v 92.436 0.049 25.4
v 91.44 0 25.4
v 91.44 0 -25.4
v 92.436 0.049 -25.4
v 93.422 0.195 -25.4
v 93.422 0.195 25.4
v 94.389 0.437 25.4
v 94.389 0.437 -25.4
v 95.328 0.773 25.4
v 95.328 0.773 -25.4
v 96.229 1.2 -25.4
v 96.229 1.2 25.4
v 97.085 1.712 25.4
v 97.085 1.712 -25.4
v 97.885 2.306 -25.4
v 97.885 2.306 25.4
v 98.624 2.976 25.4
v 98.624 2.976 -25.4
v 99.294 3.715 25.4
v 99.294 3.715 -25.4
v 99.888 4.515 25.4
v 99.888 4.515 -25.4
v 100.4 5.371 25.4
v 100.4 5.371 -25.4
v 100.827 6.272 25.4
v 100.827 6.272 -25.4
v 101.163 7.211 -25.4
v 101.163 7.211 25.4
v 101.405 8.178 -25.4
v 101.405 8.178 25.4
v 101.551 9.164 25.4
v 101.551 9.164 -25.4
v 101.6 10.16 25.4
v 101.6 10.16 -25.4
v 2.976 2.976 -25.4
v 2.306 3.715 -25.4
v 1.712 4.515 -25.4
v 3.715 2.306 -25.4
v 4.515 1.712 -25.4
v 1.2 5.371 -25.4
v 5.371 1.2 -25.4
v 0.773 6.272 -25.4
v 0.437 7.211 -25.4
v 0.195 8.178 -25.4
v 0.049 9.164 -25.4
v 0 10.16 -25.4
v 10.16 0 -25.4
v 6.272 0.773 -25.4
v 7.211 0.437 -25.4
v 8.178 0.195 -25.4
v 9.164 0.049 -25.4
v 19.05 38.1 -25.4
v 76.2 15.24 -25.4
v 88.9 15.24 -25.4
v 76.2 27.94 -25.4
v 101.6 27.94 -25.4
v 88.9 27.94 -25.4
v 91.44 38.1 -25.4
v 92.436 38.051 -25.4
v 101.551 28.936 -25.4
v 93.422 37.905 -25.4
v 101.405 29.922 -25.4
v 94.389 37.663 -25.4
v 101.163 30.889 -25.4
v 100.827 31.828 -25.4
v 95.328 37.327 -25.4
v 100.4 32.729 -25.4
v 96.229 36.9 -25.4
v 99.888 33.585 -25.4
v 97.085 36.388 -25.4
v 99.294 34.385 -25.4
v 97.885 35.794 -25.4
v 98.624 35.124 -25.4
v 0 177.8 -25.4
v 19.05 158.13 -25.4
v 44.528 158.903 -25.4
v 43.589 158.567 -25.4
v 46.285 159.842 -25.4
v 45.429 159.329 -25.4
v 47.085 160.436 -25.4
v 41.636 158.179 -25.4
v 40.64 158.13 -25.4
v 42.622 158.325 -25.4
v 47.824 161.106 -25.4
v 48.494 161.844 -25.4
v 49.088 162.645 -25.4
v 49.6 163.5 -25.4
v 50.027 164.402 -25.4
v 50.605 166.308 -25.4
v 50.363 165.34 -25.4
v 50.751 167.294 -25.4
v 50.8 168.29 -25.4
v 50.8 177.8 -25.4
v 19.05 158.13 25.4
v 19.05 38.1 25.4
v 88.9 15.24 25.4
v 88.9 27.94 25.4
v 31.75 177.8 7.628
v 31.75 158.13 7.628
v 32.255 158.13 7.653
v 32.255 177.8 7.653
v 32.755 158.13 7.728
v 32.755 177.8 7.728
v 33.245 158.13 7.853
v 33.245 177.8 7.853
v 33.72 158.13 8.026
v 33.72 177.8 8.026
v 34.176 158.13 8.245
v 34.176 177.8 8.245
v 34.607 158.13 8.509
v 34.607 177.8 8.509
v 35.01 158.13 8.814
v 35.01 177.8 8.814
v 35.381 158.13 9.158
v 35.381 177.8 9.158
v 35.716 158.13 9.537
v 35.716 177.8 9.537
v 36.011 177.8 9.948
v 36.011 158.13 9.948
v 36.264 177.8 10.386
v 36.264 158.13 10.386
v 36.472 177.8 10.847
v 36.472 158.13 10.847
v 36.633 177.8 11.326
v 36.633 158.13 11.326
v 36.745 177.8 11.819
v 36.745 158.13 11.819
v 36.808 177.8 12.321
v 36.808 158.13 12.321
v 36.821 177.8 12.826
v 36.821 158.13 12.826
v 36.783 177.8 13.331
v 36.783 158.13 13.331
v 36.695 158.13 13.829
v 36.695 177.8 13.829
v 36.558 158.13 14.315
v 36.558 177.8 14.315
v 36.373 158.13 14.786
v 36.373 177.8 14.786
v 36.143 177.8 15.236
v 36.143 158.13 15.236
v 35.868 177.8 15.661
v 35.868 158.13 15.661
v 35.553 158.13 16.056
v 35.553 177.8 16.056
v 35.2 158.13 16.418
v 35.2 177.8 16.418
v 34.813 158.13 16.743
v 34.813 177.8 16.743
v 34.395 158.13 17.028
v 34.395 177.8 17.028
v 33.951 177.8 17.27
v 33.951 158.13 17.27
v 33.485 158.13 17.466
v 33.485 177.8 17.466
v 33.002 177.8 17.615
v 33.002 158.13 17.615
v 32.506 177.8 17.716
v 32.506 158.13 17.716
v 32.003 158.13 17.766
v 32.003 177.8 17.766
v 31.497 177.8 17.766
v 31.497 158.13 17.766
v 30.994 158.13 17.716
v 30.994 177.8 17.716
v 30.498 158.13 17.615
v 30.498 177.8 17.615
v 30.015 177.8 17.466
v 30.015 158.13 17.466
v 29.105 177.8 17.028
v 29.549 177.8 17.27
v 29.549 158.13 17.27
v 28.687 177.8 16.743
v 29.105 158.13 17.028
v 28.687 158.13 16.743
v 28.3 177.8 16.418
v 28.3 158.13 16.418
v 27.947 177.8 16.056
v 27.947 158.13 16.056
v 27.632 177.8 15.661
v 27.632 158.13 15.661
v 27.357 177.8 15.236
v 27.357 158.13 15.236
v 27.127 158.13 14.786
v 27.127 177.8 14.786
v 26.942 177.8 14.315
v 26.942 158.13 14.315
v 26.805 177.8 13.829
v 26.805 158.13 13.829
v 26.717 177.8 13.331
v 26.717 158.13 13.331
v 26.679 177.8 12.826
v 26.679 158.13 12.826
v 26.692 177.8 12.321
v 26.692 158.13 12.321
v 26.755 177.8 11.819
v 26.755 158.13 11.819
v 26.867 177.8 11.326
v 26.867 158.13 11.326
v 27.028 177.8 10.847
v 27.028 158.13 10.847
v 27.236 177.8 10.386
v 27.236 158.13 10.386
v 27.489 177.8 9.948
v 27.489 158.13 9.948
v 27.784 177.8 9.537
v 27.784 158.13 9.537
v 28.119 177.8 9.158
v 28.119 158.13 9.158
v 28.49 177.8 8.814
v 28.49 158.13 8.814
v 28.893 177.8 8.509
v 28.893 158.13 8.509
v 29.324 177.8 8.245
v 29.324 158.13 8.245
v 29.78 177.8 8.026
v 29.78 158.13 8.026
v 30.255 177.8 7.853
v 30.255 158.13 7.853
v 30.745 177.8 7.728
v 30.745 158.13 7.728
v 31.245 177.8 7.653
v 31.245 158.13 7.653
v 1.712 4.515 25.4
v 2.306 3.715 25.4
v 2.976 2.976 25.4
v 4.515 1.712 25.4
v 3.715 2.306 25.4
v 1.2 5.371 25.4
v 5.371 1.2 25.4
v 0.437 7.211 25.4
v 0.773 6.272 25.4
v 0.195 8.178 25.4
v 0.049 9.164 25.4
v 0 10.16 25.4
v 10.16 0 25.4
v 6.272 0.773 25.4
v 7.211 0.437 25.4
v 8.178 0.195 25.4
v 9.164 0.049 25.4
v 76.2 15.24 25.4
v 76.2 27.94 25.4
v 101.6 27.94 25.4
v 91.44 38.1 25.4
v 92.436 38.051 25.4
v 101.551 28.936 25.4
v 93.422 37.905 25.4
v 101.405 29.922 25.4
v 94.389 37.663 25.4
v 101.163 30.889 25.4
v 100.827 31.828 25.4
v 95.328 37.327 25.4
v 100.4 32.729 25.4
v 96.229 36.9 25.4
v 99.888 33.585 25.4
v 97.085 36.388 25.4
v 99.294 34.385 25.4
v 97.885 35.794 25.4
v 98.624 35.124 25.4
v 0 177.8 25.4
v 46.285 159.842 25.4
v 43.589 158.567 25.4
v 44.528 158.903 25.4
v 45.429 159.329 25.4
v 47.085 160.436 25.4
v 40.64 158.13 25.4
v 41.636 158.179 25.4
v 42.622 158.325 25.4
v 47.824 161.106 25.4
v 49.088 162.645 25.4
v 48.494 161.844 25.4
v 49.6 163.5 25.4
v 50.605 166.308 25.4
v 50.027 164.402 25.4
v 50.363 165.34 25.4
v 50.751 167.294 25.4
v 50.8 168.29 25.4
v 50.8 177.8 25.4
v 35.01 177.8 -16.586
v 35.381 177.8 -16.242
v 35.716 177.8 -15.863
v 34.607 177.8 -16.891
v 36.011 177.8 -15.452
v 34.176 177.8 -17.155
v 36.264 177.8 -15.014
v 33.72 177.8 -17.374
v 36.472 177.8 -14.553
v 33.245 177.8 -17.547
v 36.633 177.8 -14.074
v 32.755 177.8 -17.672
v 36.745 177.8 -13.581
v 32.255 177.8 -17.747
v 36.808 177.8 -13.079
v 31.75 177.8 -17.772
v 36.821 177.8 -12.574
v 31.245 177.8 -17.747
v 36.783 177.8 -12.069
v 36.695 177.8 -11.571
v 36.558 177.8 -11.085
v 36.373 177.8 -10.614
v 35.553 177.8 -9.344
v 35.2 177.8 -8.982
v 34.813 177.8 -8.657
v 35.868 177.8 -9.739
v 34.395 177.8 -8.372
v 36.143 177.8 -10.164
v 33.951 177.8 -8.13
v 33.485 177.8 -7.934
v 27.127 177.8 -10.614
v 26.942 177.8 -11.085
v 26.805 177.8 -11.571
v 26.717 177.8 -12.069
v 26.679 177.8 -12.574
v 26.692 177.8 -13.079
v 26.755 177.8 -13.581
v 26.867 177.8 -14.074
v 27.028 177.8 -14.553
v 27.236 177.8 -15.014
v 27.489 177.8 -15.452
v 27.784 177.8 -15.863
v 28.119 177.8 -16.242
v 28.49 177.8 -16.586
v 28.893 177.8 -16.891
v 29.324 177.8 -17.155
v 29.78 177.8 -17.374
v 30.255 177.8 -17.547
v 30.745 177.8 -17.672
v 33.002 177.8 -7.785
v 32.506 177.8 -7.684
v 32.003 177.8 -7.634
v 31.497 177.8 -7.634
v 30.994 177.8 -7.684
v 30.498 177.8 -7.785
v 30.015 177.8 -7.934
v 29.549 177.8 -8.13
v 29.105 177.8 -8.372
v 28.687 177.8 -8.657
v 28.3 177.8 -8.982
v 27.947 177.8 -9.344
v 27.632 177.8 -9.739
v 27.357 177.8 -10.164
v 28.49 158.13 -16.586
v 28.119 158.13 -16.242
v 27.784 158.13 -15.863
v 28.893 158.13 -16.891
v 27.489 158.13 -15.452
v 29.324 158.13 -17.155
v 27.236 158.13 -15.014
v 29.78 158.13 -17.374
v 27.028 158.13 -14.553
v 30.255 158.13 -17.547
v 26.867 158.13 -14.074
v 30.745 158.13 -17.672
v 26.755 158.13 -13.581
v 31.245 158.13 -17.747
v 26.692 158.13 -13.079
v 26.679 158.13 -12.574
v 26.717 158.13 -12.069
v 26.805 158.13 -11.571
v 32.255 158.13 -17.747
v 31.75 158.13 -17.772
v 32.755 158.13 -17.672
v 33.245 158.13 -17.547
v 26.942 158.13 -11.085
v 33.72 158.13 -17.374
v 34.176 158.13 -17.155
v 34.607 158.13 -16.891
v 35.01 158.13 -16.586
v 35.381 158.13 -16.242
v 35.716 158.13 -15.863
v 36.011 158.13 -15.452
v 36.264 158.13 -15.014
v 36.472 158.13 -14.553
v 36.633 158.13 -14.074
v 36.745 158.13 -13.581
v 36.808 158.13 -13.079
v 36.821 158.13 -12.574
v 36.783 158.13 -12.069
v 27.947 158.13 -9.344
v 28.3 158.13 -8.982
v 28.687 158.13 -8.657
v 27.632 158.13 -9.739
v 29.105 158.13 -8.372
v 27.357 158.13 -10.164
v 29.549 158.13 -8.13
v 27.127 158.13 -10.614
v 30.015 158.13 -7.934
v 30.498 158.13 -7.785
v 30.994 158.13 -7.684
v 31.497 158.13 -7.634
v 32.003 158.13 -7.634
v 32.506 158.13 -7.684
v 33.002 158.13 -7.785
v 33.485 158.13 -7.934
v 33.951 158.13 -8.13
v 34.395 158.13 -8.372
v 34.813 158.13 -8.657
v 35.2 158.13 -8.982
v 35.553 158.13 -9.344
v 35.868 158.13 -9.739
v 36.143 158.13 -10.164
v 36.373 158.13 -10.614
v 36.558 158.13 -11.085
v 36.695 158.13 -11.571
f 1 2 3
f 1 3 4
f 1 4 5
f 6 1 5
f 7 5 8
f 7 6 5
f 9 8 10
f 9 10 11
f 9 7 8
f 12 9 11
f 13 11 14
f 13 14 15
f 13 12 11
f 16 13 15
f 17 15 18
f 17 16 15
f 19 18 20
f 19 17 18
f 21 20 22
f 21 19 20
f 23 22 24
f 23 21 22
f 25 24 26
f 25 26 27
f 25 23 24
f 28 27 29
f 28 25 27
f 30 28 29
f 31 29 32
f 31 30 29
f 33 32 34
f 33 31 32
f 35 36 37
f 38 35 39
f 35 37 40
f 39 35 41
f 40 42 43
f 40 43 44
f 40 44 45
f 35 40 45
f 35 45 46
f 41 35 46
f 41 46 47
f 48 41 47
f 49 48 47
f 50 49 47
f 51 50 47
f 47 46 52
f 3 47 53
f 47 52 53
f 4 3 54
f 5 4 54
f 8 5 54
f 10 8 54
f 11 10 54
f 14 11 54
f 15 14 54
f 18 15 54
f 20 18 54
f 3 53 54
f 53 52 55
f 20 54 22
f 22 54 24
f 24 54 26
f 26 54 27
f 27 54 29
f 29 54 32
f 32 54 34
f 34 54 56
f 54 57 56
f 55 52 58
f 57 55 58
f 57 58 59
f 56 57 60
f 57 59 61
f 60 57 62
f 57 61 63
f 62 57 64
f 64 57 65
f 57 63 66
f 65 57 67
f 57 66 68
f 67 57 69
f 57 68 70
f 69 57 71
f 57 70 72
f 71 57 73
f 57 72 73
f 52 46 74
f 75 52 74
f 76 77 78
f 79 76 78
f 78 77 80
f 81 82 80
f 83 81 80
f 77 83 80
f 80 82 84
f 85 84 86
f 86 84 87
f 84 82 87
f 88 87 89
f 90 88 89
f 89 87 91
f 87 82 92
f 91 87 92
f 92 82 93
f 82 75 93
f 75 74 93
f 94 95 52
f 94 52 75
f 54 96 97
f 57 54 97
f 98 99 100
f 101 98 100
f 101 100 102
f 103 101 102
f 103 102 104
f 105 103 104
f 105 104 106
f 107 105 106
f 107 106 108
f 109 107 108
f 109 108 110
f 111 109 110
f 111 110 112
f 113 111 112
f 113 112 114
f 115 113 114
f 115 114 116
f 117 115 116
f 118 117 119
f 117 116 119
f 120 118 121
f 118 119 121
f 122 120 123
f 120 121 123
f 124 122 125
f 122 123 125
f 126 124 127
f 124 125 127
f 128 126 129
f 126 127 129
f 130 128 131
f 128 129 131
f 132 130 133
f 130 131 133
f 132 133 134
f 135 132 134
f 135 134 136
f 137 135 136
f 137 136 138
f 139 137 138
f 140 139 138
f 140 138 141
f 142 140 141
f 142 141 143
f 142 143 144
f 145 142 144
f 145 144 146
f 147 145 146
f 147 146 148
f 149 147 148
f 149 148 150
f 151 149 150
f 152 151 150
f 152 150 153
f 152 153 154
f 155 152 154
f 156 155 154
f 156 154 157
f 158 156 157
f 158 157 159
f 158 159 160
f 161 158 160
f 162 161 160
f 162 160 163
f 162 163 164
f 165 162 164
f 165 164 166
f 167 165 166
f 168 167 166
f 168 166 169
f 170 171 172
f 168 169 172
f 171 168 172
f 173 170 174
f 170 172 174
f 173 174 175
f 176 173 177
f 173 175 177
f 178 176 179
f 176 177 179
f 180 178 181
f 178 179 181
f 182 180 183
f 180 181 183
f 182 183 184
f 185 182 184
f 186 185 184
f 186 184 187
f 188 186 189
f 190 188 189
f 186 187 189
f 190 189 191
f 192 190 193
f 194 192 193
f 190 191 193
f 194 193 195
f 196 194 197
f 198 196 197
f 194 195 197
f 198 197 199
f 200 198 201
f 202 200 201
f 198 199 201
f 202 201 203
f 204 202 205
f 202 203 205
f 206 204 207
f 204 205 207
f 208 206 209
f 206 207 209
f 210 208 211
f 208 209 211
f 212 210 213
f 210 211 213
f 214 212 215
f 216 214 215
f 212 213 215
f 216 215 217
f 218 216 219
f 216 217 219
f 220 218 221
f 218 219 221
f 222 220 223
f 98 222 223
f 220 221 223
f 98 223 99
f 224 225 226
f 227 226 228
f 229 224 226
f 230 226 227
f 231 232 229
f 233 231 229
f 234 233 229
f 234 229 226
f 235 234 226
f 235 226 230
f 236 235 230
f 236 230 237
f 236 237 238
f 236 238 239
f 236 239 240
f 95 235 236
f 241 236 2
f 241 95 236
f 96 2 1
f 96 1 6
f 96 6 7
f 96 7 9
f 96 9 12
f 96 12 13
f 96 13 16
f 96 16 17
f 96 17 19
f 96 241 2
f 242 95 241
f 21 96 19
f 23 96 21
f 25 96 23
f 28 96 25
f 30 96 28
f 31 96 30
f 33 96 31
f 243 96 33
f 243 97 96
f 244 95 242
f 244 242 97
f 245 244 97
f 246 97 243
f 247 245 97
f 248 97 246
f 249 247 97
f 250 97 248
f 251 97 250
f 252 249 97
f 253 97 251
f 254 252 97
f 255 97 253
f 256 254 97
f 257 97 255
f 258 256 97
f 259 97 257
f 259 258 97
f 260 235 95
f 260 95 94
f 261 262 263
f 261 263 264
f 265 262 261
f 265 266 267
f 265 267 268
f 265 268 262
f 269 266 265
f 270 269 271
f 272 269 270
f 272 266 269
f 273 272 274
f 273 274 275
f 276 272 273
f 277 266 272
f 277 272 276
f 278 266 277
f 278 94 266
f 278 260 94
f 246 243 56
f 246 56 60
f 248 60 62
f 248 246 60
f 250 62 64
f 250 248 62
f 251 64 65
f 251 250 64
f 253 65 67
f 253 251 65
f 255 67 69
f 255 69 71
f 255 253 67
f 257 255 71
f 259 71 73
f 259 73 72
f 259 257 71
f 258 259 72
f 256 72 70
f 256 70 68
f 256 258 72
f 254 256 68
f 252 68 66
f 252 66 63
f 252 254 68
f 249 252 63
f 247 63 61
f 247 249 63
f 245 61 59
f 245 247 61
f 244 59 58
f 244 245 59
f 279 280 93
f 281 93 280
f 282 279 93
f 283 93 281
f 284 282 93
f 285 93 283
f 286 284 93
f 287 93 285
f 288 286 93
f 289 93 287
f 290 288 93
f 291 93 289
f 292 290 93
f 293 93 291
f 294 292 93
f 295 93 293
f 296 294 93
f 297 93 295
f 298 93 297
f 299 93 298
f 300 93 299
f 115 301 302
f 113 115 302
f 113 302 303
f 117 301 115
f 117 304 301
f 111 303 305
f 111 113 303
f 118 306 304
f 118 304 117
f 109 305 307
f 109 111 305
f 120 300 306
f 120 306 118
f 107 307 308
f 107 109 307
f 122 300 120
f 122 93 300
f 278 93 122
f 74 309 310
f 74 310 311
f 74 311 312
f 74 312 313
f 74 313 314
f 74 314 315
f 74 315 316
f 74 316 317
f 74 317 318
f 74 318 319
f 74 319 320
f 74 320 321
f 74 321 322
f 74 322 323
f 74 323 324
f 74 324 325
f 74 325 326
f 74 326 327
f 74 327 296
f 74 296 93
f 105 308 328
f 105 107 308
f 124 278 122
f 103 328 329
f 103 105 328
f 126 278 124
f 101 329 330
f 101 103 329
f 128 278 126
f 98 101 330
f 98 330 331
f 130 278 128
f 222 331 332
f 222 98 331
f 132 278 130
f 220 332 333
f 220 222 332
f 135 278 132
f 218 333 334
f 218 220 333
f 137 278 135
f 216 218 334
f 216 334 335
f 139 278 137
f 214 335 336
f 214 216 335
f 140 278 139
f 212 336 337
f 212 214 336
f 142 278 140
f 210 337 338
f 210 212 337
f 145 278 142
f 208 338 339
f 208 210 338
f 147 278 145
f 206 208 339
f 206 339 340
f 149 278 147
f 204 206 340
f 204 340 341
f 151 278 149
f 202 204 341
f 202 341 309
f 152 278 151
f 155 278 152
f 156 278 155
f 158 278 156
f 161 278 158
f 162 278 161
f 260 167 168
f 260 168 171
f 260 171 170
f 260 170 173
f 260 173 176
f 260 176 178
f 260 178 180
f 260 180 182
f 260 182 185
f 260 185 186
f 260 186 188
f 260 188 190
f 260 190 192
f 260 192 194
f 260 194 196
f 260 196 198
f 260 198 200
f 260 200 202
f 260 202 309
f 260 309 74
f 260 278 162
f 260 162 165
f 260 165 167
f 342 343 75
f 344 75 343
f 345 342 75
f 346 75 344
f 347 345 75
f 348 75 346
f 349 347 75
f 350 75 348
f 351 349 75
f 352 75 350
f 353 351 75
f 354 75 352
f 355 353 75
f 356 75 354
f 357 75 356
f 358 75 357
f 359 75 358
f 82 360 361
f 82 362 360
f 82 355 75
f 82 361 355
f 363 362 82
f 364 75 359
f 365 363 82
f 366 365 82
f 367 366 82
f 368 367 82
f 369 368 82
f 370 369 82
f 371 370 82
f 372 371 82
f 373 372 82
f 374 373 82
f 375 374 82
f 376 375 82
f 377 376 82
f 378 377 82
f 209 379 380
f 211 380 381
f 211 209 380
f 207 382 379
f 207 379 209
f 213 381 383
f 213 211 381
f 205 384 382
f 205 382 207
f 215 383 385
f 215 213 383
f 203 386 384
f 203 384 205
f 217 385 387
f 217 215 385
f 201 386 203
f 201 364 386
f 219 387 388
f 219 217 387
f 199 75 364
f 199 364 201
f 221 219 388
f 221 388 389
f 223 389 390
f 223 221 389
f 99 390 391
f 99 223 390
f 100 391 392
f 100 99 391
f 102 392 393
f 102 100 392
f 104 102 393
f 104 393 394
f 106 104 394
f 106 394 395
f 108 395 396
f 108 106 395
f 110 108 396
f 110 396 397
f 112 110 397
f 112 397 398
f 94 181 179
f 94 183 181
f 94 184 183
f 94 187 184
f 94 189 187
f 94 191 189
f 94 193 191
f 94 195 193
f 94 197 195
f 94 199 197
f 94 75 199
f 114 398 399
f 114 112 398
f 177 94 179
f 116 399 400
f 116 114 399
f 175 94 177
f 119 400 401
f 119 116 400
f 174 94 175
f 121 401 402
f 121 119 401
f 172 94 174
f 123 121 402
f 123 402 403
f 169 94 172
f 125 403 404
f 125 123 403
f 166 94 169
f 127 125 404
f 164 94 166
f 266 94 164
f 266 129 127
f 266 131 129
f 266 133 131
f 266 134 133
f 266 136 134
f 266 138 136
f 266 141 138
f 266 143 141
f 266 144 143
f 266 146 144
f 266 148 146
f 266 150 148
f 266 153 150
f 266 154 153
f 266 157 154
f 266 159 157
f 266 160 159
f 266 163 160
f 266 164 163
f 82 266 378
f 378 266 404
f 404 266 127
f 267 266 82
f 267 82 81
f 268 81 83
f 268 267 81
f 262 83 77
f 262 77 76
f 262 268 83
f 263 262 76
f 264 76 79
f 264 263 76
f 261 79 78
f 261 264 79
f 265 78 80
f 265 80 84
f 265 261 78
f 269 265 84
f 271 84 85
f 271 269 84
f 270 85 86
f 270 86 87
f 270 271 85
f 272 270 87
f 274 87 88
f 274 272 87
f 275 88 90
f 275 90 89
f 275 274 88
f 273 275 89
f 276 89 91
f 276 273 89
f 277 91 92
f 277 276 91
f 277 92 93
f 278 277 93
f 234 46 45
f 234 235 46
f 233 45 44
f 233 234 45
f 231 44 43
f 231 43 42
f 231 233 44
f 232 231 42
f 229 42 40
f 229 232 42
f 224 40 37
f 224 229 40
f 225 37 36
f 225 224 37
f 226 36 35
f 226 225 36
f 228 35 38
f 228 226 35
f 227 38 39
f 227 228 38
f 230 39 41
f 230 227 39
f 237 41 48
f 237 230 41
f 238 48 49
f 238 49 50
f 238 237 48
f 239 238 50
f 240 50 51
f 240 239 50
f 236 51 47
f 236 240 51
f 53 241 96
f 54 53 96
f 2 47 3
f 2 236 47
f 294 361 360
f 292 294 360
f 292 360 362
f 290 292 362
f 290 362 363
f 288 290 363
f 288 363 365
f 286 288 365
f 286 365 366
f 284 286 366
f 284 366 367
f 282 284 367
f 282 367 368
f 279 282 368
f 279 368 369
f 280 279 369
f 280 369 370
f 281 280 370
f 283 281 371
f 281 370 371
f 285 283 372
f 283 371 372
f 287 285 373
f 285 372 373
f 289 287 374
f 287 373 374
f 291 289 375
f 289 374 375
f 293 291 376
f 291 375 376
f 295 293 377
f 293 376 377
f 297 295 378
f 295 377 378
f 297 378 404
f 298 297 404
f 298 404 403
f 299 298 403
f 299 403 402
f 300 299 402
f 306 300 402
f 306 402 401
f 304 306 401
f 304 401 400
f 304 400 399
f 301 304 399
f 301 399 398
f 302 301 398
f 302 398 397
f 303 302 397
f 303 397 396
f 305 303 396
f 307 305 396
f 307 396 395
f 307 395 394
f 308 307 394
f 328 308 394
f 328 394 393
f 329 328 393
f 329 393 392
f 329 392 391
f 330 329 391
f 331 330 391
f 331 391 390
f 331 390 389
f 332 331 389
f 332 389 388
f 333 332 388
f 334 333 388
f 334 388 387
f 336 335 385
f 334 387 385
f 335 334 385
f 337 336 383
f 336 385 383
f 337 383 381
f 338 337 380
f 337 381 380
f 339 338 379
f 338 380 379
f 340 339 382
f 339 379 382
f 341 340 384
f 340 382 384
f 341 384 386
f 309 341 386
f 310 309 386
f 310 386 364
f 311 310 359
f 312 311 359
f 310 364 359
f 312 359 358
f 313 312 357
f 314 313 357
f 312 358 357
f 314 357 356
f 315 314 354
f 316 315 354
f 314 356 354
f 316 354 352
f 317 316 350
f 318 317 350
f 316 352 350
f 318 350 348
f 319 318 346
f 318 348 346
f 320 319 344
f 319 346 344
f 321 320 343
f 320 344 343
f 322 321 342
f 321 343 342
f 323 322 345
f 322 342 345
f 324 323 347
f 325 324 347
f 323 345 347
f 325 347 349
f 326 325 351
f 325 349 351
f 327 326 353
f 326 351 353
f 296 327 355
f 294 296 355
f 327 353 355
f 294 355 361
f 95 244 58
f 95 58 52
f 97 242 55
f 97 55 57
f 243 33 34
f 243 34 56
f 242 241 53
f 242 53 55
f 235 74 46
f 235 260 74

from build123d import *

# Parameters (mm, degrees)
BOSS_EXTRUDE1_DEPTH = 25.4
SKETCH2_W           = 12.7
SKETCH2_H           = 12.7
CUT_EXTRUDE1_DEPTH  = 50.8
SKETCH3_R           = 5.072330543
CUT_EXTRUDE2_DEPTH  = 50.8


with BuildPart() as part:
    # Sketch1 → Boss-Extrude1 (new, symmetric)
    with BuildSketch(Plane.XY):
        with BuildLine():
            Line((10.16, 0), (91.44, 0))
            ThreePointArc((91.44, 0), (98.624204897, 2.975795103), (101.6, 10.16))
            Line((101.6, 10.16), (101.6, 27.94))
            ThreePointArc((101.6, 27.94), (98.624204897, 35.124204897), (91.44, 38.1))
            Line((91.44, 38.1), (19.05, 38.1))
            Line((19.05, 38.1), (19.05, 158.129767442))
            Line((19.05, 158.129767442), (40.64, 158.129767442))
            ThreePointArc((40.64, 158.129767442), (47.824204897, 161.105562545), (50.8, 168.289767442))
            Line((50.8, 168.289767442), (50.8, 177.8))
            Line((50.8, 177.8), (0, 177.8))
            Line((0, 177.8), (0, 10.16))
            ThreePointArc((0, 10.16), (2.975795103, 2.975795103), (10.16, 0))
        make_face()
    extrude(amount=BOSS_EXTRUDE1_DEPTH, both=True)

    # Sketch2 → Cut-Extrude1 (cut)
    with BuildSketch(Plane.XY.offset(25.4)):
        with Locations((82.55, 21.59)):
            Rectangle(SKETCH2_W, SKETCH2_H)
    extrude(amount=-CUT_EXTRUDE1_DEPTH, mode=Mode.SUBTRACT)

    # Sketch3 → Cut-Extrude2 (cut)
    with BuildSketch(Plane.XZ.offset(-158.129767442)):
        with Locations(Location((31.75, 12.7, 0), (0, 0, 270))):
            Circle(SKETCH3_R)
        with Locations(Location((31.75, -12.7, 0), (0, 0, 270))):
            Circle(SKETCH3_R)
    extrude(amount=-CUT_EXTRUDE2_DEPTH, mode=Mode.SUBTRACT)


solid = part.part
